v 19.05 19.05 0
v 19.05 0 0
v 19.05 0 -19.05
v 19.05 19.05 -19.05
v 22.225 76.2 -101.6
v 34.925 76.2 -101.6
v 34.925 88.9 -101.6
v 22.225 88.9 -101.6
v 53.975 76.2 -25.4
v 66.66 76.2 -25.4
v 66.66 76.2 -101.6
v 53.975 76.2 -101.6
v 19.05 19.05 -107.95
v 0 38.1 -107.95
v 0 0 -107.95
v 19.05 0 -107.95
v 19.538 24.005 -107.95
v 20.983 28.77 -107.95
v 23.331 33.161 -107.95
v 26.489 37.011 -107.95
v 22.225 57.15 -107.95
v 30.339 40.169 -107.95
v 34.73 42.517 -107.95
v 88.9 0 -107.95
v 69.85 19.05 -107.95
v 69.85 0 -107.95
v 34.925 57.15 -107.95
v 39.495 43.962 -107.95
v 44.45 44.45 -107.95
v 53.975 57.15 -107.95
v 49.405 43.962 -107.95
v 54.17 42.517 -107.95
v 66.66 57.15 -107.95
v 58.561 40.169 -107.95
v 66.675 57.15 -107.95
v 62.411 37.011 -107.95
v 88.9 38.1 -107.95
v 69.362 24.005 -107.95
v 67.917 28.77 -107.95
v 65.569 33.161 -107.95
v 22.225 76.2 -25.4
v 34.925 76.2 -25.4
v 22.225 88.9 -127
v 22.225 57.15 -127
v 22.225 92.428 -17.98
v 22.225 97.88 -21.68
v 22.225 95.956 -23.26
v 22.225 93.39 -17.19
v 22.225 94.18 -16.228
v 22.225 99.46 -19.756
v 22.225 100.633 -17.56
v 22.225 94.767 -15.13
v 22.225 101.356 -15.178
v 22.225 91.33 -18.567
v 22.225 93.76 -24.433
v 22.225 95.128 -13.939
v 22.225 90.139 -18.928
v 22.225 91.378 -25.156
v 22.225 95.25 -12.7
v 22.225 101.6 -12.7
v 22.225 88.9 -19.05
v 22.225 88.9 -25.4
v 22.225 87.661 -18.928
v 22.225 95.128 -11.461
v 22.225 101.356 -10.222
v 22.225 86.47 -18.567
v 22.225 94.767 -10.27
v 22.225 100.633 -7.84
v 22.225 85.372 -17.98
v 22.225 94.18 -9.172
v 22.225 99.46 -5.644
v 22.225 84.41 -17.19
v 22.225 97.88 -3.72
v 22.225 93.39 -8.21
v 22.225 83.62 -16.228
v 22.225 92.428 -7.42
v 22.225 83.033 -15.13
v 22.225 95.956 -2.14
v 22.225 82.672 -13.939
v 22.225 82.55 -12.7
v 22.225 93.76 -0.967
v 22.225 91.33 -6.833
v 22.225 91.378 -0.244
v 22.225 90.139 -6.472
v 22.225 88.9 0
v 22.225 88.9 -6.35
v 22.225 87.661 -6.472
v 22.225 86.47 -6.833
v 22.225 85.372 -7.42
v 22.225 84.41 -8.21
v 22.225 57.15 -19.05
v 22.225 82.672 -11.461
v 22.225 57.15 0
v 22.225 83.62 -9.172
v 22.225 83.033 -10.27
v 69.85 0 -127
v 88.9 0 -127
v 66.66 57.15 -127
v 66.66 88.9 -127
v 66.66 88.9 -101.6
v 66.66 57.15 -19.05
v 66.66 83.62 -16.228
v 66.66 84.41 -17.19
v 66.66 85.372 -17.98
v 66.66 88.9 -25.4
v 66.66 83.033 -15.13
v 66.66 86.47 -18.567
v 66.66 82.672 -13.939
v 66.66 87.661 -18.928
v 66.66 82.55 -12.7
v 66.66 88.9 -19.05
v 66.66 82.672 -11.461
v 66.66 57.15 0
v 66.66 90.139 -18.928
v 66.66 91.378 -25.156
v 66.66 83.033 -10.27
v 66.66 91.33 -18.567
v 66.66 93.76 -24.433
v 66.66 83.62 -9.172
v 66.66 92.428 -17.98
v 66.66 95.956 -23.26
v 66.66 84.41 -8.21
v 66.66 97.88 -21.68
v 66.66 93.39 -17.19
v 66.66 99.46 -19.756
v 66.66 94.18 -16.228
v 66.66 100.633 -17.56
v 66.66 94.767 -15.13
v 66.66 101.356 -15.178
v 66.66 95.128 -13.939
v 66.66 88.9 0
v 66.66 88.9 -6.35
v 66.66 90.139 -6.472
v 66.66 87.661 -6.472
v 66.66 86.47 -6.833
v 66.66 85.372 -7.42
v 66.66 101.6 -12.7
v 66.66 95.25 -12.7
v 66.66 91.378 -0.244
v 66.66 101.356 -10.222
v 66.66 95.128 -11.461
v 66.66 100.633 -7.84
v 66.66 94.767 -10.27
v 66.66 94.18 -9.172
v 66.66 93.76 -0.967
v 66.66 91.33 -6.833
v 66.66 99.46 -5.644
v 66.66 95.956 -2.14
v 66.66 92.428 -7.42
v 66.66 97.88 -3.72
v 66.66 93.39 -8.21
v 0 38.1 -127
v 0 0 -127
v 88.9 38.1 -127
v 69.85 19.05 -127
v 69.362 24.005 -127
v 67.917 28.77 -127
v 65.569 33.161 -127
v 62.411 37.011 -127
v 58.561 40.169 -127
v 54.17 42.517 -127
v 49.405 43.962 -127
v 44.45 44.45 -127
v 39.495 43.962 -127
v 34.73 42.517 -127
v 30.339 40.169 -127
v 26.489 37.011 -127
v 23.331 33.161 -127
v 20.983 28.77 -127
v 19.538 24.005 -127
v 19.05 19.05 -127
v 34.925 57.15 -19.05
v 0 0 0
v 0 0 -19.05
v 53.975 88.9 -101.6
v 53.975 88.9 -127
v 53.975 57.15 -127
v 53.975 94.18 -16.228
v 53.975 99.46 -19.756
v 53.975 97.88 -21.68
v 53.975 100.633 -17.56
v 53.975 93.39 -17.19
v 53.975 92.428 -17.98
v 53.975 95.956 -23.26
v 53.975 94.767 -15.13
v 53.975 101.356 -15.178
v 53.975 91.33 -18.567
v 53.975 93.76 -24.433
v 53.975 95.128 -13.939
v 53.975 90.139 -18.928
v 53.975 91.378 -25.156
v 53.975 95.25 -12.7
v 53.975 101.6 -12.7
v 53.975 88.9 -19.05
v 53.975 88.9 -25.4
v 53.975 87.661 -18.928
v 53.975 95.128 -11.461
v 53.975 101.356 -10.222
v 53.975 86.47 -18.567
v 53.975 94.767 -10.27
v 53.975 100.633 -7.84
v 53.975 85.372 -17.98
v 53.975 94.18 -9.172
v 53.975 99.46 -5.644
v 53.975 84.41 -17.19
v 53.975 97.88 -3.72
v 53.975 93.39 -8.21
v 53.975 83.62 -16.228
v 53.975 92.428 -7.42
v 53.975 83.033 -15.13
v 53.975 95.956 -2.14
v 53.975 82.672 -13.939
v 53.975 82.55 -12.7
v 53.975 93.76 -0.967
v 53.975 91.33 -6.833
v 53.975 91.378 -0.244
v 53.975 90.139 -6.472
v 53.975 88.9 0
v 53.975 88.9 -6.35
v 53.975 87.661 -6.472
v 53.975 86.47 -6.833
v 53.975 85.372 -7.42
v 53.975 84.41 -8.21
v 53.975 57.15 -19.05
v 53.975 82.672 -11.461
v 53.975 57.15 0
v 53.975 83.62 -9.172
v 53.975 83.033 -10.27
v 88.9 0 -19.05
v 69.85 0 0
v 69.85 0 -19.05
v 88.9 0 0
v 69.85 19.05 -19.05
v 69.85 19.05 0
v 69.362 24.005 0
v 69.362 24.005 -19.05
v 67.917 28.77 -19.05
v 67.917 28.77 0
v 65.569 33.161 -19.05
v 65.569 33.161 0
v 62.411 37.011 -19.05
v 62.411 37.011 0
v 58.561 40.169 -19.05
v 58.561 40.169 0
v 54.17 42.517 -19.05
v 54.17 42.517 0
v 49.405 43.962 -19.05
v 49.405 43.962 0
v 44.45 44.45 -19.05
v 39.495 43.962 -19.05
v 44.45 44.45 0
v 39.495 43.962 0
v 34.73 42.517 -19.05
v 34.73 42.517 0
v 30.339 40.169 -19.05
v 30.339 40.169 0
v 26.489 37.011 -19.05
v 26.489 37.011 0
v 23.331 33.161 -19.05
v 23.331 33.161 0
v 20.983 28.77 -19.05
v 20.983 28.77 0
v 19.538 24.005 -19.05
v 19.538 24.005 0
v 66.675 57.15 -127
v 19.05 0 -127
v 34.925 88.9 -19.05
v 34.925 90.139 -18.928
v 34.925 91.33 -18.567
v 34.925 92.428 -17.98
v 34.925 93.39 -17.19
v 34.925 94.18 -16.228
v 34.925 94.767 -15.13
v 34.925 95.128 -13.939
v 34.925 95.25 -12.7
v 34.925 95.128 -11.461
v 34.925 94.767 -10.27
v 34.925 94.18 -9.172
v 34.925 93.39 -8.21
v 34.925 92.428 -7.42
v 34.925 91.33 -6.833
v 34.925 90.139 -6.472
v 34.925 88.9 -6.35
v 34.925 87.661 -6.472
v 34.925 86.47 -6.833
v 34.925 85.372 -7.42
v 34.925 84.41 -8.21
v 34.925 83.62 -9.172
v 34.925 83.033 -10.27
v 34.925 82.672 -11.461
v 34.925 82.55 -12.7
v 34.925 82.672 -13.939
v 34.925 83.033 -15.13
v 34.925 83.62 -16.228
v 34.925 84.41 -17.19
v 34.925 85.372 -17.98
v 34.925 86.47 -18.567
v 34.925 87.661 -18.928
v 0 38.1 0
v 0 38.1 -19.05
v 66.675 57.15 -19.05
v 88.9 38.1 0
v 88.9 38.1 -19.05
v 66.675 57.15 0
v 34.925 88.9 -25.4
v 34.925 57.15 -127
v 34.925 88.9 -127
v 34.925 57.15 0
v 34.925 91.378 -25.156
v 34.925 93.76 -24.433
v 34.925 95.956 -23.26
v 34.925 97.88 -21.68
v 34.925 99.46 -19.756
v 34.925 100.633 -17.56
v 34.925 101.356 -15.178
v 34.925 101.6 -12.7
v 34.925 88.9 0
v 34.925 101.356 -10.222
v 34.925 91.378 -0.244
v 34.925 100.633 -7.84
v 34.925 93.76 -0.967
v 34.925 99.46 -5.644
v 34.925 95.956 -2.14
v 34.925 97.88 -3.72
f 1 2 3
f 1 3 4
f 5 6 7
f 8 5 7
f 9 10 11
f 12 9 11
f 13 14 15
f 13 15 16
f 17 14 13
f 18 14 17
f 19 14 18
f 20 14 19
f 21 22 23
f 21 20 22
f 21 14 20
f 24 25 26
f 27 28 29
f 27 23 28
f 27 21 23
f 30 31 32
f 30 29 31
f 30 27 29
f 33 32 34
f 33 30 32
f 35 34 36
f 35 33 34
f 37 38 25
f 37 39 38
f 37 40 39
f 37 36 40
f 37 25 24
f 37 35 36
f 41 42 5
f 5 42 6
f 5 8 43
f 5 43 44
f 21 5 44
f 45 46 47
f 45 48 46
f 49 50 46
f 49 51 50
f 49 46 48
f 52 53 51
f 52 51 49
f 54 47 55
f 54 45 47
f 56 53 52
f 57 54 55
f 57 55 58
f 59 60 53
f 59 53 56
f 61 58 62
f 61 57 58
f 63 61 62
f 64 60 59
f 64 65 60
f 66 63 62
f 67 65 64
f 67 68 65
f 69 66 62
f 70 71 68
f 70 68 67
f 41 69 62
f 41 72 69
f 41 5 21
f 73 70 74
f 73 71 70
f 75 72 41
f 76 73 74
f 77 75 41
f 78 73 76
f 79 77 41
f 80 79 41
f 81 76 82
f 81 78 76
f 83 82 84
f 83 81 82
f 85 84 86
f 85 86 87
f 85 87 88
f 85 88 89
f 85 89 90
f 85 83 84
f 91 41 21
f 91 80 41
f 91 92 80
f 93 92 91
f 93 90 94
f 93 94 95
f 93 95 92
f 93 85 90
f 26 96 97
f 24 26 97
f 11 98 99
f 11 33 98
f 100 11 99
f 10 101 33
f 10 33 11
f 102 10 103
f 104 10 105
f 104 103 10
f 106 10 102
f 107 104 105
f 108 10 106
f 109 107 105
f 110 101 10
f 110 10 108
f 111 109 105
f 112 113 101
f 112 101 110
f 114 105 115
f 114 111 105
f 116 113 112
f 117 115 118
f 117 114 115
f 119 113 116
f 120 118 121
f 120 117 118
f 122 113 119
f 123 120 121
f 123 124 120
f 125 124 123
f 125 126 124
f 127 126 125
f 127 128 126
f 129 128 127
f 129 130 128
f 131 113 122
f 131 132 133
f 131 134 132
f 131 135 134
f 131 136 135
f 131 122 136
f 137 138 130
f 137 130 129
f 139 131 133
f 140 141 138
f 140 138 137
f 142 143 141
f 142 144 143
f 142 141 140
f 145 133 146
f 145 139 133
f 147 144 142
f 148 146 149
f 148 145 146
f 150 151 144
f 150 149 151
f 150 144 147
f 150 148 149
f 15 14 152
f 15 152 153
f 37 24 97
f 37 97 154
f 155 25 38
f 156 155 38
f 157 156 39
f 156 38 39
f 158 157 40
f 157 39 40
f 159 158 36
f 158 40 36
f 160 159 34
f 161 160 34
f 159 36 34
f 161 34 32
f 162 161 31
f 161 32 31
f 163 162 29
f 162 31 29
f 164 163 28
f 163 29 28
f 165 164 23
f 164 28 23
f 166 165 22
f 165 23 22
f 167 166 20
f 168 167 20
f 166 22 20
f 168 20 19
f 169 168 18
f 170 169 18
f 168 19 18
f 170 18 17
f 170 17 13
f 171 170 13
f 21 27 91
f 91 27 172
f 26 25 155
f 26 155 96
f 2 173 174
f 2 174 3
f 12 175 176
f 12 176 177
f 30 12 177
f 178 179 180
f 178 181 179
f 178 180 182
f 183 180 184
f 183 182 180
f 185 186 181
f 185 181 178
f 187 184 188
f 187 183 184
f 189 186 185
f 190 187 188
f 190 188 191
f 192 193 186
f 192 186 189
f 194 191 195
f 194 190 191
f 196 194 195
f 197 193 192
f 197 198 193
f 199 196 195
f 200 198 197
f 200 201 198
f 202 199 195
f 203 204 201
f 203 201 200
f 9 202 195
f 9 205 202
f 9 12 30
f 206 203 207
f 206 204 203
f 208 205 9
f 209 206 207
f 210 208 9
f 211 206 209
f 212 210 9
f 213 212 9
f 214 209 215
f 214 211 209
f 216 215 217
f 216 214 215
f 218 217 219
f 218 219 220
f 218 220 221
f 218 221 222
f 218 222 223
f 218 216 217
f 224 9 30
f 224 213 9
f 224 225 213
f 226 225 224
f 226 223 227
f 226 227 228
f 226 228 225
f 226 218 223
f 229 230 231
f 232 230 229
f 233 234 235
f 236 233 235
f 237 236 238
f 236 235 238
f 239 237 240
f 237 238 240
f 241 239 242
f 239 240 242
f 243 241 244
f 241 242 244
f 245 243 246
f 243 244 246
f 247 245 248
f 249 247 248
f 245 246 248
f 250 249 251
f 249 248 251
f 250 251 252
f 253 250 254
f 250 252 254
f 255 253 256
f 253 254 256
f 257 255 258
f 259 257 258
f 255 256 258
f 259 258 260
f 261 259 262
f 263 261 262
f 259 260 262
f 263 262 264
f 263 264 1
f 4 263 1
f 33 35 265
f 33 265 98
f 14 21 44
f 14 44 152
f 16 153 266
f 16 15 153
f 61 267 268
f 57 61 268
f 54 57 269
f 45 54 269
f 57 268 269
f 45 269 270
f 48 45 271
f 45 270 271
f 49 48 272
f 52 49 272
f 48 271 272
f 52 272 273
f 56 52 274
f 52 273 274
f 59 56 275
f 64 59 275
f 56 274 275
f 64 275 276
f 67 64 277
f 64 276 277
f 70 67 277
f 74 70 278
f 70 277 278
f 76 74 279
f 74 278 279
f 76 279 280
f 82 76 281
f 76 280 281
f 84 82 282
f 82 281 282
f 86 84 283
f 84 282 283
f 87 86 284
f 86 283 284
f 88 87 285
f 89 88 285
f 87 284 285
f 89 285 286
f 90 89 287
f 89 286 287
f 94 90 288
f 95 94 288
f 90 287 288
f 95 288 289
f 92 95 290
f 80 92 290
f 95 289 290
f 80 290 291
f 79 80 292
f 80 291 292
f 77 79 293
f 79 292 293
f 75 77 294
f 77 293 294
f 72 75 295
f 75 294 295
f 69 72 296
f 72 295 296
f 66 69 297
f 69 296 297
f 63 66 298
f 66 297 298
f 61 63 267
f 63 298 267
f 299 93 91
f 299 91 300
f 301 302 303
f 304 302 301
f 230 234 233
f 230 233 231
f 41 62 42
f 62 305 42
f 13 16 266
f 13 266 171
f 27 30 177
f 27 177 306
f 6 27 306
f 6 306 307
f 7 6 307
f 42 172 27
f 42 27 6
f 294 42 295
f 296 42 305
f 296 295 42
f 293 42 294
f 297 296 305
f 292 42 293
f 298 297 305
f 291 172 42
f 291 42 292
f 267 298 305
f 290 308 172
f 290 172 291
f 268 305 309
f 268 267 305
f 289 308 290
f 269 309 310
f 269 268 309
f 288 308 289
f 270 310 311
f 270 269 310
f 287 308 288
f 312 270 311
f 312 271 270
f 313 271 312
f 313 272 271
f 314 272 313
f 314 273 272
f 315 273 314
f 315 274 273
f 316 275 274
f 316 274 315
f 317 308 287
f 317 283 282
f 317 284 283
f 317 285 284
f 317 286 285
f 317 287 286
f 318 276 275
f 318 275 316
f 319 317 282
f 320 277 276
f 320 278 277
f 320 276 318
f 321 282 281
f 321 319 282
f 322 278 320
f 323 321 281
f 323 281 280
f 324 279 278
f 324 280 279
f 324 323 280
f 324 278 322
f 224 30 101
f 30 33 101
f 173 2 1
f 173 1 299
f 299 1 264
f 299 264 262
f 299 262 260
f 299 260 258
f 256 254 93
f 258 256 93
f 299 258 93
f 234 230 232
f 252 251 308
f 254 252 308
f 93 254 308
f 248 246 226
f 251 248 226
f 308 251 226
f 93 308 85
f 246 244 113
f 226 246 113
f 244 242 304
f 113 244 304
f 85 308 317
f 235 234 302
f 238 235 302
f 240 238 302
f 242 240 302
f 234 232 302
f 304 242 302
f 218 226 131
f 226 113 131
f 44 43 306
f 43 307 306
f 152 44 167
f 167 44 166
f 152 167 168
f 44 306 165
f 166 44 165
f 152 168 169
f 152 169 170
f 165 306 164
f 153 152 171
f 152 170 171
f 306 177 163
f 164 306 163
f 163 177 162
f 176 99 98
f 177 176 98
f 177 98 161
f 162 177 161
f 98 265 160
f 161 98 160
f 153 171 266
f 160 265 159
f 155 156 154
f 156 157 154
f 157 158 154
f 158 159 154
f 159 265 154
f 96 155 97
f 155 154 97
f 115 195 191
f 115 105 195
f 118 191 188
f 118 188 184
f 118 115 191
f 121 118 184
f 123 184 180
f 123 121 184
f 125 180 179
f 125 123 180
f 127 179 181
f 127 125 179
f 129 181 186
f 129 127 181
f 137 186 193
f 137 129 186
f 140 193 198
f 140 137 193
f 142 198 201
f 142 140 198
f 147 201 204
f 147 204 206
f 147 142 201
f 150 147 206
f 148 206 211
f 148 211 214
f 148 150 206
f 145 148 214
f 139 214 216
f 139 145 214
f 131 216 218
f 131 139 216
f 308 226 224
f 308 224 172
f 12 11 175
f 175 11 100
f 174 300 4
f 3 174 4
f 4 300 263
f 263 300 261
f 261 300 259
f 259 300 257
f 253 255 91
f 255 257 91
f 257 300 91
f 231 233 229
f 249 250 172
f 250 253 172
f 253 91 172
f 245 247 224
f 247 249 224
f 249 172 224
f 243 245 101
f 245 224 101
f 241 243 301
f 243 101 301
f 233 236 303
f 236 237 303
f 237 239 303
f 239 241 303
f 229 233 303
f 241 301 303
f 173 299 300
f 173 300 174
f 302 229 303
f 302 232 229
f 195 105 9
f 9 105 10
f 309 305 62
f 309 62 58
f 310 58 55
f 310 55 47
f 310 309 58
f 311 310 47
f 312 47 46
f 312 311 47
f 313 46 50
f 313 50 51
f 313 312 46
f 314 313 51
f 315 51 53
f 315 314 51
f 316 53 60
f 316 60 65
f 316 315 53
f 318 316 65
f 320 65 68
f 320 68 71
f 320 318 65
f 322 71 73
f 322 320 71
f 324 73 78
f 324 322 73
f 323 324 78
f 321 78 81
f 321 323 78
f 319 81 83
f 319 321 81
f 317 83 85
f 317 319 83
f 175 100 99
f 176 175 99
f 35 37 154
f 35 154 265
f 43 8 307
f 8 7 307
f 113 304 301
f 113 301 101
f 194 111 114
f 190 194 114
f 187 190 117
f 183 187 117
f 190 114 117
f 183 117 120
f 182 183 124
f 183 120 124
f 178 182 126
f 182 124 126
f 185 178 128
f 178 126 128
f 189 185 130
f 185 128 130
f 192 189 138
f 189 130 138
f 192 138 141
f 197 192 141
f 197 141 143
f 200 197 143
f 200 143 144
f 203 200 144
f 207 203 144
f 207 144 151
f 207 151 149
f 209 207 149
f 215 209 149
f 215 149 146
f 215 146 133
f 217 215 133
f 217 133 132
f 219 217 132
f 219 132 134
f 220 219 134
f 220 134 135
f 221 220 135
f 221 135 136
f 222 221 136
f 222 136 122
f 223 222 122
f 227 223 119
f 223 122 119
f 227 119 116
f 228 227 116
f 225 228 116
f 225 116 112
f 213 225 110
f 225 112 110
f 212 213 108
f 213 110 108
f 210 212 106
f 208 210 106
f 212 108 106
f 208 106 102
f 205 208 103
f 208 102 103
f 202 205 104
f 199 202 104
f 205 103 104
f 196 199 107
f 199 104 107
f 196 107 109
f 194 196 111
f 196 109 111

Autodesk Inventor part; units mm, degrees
ref_plane "YZ Plane" through (0, 0, 0) normal (1, 0, 0) x (0, 1, 0)
ref_plane "XZ Plane" through (0, 0, 0) normal (0, 1, 0) x (-1, 0, 0)
ref_plane "XY Plane" through (0, 0, 0) normal (0, 0, 1) x (1, 0, 0)
sketch "Sketch1" plane through (0, 0, 0) normal (0, 0, 1) x (1, 0, 0)
  line L0 (0, 0) -> (19.05, 0)
  line L1 (19.05, 0) -> (19.05, 19.05)
  line L2 (69.85, 19.05) -> (69.85, 0)
  line L3 (69.85, 0) -> (88.9, 0)
  line L4 (88.9, 0) -> (88.9, 38.1)
  line L5 (88.9, 38.1) -> (66.675, 57.15)
  line L6 (66.675, 57.15) -> (22.225, 57.15)
  line L7 (22.225, 57.15) -> (0, 38.1)
  line L8 (0, 38.1) -> (0, 0)
  arc A0 (69.85, 19.05) -> (19.05, 19.05) centre (44.45, 19.05) ccw
  dimension "d0" = 38.1
  dimension "d1" = 44.45
  dimension "d2" = 88.9
  dimension "d3" = 19.05
  dimension "d5" = 19.05
  dimension "d6" = 19.05
extrude "Extrusion1" add sketch "Sketch1" against normal blind 127
sketch "Sketch2" plane through (22.225, 57.15, 0) normal (0, 1, 0) x (1, 0, 0)
  line L0 (-22.225, 19.05) -> (68.7148, 19.05)
  line L1 (-22.225, 0) -> (-22.225, 127) projected
  line L2 (-22.225, 107.95) -> (68.7148, 107.95)
  line L3 (68.7148, 107.95) -> (68.7148, 19.05)
  line L4 (-22.225, 19.05) -> (-22.225, 107.95)
  line L5 (44.45, 0) -> (0, 0) projected
  line L6 (0, 127) -> (44.45, 127) projected
  dimension "d9" = 19.05
  dimension "d10" = 19.05
extrude "Extrusion2" cut sketch "Sketch2" against normal through all
sketch "Sketch3" plane through (88.9, 0, 0) normal (1, 0, 0) x (0, 0, -1)
  point P0 (0, 0)
sketch "Sketch4" plane through (88.9, 0, 0) normal (1, 0, 0) x (0, 0, -1)
  line L0 (0, 57.15) -> (0, 88.9)
  line L1 (25.4, 88.9) -> (25.4, 76.2)
  line L2 (25.4, 76.2) -> (101.6, 76.2)
  line L3 (101.6, 76.2) -> (101.6, 88.9)
  line L4 (101.6, 88.9) -> (127, 88.9)
  line L5 (127, 88.9) -> (127, 57.15)
  line L6 (127, 57.15) -> (0, 57.15)
  arc A0 (25.4, 88.9) -> (0, 88.9) centre (12.7, 88.9) ccw
  circle A1 centre (12.7, 88.9) radius 6.35
  point P0 (0, 0)
  dimension "d13" = 31.75
  dimension "d14" = 25.4
  dimension "d15" = 12.7
  dimension "d17" = 12.7
extrude "Extrusion3" add sketch "Sketch4" against normal blind 88.9
sketch "Sketch5" plane through (0, 0, 0) normal (0, 0, 1) x (1, 0, 0)
  line L0 (22.225, 104.8309) -> (22.225, 46.8186)
  line L1 (66.675, 46.8186) -> (66.6601, 105.2632)
  line L2 (0, 57.15) -> (0, 88.9) projected
  line L3 (22.225, 104.8309) -> (0, 104.8309)
  line L4 (0, 104.8309) -> (0, 57.15)
  line L5 (22.225, 57.15) -> (22.225, 104.8309)
  line L6 (66.6601, 105.2632) -> (88.8851, 105.2632)
  line L7 (88.8851, 105.2632) -> (88.8851, 57.15)
  line L8 (88.8851, 57.15) -> (66.675, 57.15)
  line L9 (0, 57.15) -> (22.225, 57.15)
  line L10 (22.225, 57.15) -> (0, 57.15) projected
  line L11 (88.9, 57.15) -> (66.675, 57.15) projected
  line L12 (66.6601, 105.2632) -> (88.9, 105.2632)
  line L13 (88.9, 105.2632) -> (88.9, 57.15)
  line L14 (88.9, 57.15) -> (66.6601, 57.15)
  line L15 (66.6601, 57.15) -> (66.6601, 105.2632)
  point P0 (0, 0)
  dimension "d20" = 22.225
  dimension "d21" = 44.45
extrude "Extrusion4" cut sketch "Sketch5" against normal through all
sketch "Sketch6" plane through (0, 0, 0) normal (0, 0, 1) x (1, 0, 0)
  line L0 (66.6601, 57.15) -> (22.225, 57.15) projected
  line L1 (34.925, 57.15) -> (34.925, 106.1689)
  line L2 (34.925, 106.1689) -> (53.975, 106.1689)
  line L3 (53.975, 106.1689) -> (53.975, 57.15)
  line L4 (22.225, 88.9) -> (22.225, 57.15) projected
  point P0 (0, 0)
  dimension "d24" = 19.05
  dimension "d25" = 12.7
extrude "Extrusion5" cut sketch "Sketch6" against normal through all
properties part number "HW 4 Part 4" material "Iron, Cast"
